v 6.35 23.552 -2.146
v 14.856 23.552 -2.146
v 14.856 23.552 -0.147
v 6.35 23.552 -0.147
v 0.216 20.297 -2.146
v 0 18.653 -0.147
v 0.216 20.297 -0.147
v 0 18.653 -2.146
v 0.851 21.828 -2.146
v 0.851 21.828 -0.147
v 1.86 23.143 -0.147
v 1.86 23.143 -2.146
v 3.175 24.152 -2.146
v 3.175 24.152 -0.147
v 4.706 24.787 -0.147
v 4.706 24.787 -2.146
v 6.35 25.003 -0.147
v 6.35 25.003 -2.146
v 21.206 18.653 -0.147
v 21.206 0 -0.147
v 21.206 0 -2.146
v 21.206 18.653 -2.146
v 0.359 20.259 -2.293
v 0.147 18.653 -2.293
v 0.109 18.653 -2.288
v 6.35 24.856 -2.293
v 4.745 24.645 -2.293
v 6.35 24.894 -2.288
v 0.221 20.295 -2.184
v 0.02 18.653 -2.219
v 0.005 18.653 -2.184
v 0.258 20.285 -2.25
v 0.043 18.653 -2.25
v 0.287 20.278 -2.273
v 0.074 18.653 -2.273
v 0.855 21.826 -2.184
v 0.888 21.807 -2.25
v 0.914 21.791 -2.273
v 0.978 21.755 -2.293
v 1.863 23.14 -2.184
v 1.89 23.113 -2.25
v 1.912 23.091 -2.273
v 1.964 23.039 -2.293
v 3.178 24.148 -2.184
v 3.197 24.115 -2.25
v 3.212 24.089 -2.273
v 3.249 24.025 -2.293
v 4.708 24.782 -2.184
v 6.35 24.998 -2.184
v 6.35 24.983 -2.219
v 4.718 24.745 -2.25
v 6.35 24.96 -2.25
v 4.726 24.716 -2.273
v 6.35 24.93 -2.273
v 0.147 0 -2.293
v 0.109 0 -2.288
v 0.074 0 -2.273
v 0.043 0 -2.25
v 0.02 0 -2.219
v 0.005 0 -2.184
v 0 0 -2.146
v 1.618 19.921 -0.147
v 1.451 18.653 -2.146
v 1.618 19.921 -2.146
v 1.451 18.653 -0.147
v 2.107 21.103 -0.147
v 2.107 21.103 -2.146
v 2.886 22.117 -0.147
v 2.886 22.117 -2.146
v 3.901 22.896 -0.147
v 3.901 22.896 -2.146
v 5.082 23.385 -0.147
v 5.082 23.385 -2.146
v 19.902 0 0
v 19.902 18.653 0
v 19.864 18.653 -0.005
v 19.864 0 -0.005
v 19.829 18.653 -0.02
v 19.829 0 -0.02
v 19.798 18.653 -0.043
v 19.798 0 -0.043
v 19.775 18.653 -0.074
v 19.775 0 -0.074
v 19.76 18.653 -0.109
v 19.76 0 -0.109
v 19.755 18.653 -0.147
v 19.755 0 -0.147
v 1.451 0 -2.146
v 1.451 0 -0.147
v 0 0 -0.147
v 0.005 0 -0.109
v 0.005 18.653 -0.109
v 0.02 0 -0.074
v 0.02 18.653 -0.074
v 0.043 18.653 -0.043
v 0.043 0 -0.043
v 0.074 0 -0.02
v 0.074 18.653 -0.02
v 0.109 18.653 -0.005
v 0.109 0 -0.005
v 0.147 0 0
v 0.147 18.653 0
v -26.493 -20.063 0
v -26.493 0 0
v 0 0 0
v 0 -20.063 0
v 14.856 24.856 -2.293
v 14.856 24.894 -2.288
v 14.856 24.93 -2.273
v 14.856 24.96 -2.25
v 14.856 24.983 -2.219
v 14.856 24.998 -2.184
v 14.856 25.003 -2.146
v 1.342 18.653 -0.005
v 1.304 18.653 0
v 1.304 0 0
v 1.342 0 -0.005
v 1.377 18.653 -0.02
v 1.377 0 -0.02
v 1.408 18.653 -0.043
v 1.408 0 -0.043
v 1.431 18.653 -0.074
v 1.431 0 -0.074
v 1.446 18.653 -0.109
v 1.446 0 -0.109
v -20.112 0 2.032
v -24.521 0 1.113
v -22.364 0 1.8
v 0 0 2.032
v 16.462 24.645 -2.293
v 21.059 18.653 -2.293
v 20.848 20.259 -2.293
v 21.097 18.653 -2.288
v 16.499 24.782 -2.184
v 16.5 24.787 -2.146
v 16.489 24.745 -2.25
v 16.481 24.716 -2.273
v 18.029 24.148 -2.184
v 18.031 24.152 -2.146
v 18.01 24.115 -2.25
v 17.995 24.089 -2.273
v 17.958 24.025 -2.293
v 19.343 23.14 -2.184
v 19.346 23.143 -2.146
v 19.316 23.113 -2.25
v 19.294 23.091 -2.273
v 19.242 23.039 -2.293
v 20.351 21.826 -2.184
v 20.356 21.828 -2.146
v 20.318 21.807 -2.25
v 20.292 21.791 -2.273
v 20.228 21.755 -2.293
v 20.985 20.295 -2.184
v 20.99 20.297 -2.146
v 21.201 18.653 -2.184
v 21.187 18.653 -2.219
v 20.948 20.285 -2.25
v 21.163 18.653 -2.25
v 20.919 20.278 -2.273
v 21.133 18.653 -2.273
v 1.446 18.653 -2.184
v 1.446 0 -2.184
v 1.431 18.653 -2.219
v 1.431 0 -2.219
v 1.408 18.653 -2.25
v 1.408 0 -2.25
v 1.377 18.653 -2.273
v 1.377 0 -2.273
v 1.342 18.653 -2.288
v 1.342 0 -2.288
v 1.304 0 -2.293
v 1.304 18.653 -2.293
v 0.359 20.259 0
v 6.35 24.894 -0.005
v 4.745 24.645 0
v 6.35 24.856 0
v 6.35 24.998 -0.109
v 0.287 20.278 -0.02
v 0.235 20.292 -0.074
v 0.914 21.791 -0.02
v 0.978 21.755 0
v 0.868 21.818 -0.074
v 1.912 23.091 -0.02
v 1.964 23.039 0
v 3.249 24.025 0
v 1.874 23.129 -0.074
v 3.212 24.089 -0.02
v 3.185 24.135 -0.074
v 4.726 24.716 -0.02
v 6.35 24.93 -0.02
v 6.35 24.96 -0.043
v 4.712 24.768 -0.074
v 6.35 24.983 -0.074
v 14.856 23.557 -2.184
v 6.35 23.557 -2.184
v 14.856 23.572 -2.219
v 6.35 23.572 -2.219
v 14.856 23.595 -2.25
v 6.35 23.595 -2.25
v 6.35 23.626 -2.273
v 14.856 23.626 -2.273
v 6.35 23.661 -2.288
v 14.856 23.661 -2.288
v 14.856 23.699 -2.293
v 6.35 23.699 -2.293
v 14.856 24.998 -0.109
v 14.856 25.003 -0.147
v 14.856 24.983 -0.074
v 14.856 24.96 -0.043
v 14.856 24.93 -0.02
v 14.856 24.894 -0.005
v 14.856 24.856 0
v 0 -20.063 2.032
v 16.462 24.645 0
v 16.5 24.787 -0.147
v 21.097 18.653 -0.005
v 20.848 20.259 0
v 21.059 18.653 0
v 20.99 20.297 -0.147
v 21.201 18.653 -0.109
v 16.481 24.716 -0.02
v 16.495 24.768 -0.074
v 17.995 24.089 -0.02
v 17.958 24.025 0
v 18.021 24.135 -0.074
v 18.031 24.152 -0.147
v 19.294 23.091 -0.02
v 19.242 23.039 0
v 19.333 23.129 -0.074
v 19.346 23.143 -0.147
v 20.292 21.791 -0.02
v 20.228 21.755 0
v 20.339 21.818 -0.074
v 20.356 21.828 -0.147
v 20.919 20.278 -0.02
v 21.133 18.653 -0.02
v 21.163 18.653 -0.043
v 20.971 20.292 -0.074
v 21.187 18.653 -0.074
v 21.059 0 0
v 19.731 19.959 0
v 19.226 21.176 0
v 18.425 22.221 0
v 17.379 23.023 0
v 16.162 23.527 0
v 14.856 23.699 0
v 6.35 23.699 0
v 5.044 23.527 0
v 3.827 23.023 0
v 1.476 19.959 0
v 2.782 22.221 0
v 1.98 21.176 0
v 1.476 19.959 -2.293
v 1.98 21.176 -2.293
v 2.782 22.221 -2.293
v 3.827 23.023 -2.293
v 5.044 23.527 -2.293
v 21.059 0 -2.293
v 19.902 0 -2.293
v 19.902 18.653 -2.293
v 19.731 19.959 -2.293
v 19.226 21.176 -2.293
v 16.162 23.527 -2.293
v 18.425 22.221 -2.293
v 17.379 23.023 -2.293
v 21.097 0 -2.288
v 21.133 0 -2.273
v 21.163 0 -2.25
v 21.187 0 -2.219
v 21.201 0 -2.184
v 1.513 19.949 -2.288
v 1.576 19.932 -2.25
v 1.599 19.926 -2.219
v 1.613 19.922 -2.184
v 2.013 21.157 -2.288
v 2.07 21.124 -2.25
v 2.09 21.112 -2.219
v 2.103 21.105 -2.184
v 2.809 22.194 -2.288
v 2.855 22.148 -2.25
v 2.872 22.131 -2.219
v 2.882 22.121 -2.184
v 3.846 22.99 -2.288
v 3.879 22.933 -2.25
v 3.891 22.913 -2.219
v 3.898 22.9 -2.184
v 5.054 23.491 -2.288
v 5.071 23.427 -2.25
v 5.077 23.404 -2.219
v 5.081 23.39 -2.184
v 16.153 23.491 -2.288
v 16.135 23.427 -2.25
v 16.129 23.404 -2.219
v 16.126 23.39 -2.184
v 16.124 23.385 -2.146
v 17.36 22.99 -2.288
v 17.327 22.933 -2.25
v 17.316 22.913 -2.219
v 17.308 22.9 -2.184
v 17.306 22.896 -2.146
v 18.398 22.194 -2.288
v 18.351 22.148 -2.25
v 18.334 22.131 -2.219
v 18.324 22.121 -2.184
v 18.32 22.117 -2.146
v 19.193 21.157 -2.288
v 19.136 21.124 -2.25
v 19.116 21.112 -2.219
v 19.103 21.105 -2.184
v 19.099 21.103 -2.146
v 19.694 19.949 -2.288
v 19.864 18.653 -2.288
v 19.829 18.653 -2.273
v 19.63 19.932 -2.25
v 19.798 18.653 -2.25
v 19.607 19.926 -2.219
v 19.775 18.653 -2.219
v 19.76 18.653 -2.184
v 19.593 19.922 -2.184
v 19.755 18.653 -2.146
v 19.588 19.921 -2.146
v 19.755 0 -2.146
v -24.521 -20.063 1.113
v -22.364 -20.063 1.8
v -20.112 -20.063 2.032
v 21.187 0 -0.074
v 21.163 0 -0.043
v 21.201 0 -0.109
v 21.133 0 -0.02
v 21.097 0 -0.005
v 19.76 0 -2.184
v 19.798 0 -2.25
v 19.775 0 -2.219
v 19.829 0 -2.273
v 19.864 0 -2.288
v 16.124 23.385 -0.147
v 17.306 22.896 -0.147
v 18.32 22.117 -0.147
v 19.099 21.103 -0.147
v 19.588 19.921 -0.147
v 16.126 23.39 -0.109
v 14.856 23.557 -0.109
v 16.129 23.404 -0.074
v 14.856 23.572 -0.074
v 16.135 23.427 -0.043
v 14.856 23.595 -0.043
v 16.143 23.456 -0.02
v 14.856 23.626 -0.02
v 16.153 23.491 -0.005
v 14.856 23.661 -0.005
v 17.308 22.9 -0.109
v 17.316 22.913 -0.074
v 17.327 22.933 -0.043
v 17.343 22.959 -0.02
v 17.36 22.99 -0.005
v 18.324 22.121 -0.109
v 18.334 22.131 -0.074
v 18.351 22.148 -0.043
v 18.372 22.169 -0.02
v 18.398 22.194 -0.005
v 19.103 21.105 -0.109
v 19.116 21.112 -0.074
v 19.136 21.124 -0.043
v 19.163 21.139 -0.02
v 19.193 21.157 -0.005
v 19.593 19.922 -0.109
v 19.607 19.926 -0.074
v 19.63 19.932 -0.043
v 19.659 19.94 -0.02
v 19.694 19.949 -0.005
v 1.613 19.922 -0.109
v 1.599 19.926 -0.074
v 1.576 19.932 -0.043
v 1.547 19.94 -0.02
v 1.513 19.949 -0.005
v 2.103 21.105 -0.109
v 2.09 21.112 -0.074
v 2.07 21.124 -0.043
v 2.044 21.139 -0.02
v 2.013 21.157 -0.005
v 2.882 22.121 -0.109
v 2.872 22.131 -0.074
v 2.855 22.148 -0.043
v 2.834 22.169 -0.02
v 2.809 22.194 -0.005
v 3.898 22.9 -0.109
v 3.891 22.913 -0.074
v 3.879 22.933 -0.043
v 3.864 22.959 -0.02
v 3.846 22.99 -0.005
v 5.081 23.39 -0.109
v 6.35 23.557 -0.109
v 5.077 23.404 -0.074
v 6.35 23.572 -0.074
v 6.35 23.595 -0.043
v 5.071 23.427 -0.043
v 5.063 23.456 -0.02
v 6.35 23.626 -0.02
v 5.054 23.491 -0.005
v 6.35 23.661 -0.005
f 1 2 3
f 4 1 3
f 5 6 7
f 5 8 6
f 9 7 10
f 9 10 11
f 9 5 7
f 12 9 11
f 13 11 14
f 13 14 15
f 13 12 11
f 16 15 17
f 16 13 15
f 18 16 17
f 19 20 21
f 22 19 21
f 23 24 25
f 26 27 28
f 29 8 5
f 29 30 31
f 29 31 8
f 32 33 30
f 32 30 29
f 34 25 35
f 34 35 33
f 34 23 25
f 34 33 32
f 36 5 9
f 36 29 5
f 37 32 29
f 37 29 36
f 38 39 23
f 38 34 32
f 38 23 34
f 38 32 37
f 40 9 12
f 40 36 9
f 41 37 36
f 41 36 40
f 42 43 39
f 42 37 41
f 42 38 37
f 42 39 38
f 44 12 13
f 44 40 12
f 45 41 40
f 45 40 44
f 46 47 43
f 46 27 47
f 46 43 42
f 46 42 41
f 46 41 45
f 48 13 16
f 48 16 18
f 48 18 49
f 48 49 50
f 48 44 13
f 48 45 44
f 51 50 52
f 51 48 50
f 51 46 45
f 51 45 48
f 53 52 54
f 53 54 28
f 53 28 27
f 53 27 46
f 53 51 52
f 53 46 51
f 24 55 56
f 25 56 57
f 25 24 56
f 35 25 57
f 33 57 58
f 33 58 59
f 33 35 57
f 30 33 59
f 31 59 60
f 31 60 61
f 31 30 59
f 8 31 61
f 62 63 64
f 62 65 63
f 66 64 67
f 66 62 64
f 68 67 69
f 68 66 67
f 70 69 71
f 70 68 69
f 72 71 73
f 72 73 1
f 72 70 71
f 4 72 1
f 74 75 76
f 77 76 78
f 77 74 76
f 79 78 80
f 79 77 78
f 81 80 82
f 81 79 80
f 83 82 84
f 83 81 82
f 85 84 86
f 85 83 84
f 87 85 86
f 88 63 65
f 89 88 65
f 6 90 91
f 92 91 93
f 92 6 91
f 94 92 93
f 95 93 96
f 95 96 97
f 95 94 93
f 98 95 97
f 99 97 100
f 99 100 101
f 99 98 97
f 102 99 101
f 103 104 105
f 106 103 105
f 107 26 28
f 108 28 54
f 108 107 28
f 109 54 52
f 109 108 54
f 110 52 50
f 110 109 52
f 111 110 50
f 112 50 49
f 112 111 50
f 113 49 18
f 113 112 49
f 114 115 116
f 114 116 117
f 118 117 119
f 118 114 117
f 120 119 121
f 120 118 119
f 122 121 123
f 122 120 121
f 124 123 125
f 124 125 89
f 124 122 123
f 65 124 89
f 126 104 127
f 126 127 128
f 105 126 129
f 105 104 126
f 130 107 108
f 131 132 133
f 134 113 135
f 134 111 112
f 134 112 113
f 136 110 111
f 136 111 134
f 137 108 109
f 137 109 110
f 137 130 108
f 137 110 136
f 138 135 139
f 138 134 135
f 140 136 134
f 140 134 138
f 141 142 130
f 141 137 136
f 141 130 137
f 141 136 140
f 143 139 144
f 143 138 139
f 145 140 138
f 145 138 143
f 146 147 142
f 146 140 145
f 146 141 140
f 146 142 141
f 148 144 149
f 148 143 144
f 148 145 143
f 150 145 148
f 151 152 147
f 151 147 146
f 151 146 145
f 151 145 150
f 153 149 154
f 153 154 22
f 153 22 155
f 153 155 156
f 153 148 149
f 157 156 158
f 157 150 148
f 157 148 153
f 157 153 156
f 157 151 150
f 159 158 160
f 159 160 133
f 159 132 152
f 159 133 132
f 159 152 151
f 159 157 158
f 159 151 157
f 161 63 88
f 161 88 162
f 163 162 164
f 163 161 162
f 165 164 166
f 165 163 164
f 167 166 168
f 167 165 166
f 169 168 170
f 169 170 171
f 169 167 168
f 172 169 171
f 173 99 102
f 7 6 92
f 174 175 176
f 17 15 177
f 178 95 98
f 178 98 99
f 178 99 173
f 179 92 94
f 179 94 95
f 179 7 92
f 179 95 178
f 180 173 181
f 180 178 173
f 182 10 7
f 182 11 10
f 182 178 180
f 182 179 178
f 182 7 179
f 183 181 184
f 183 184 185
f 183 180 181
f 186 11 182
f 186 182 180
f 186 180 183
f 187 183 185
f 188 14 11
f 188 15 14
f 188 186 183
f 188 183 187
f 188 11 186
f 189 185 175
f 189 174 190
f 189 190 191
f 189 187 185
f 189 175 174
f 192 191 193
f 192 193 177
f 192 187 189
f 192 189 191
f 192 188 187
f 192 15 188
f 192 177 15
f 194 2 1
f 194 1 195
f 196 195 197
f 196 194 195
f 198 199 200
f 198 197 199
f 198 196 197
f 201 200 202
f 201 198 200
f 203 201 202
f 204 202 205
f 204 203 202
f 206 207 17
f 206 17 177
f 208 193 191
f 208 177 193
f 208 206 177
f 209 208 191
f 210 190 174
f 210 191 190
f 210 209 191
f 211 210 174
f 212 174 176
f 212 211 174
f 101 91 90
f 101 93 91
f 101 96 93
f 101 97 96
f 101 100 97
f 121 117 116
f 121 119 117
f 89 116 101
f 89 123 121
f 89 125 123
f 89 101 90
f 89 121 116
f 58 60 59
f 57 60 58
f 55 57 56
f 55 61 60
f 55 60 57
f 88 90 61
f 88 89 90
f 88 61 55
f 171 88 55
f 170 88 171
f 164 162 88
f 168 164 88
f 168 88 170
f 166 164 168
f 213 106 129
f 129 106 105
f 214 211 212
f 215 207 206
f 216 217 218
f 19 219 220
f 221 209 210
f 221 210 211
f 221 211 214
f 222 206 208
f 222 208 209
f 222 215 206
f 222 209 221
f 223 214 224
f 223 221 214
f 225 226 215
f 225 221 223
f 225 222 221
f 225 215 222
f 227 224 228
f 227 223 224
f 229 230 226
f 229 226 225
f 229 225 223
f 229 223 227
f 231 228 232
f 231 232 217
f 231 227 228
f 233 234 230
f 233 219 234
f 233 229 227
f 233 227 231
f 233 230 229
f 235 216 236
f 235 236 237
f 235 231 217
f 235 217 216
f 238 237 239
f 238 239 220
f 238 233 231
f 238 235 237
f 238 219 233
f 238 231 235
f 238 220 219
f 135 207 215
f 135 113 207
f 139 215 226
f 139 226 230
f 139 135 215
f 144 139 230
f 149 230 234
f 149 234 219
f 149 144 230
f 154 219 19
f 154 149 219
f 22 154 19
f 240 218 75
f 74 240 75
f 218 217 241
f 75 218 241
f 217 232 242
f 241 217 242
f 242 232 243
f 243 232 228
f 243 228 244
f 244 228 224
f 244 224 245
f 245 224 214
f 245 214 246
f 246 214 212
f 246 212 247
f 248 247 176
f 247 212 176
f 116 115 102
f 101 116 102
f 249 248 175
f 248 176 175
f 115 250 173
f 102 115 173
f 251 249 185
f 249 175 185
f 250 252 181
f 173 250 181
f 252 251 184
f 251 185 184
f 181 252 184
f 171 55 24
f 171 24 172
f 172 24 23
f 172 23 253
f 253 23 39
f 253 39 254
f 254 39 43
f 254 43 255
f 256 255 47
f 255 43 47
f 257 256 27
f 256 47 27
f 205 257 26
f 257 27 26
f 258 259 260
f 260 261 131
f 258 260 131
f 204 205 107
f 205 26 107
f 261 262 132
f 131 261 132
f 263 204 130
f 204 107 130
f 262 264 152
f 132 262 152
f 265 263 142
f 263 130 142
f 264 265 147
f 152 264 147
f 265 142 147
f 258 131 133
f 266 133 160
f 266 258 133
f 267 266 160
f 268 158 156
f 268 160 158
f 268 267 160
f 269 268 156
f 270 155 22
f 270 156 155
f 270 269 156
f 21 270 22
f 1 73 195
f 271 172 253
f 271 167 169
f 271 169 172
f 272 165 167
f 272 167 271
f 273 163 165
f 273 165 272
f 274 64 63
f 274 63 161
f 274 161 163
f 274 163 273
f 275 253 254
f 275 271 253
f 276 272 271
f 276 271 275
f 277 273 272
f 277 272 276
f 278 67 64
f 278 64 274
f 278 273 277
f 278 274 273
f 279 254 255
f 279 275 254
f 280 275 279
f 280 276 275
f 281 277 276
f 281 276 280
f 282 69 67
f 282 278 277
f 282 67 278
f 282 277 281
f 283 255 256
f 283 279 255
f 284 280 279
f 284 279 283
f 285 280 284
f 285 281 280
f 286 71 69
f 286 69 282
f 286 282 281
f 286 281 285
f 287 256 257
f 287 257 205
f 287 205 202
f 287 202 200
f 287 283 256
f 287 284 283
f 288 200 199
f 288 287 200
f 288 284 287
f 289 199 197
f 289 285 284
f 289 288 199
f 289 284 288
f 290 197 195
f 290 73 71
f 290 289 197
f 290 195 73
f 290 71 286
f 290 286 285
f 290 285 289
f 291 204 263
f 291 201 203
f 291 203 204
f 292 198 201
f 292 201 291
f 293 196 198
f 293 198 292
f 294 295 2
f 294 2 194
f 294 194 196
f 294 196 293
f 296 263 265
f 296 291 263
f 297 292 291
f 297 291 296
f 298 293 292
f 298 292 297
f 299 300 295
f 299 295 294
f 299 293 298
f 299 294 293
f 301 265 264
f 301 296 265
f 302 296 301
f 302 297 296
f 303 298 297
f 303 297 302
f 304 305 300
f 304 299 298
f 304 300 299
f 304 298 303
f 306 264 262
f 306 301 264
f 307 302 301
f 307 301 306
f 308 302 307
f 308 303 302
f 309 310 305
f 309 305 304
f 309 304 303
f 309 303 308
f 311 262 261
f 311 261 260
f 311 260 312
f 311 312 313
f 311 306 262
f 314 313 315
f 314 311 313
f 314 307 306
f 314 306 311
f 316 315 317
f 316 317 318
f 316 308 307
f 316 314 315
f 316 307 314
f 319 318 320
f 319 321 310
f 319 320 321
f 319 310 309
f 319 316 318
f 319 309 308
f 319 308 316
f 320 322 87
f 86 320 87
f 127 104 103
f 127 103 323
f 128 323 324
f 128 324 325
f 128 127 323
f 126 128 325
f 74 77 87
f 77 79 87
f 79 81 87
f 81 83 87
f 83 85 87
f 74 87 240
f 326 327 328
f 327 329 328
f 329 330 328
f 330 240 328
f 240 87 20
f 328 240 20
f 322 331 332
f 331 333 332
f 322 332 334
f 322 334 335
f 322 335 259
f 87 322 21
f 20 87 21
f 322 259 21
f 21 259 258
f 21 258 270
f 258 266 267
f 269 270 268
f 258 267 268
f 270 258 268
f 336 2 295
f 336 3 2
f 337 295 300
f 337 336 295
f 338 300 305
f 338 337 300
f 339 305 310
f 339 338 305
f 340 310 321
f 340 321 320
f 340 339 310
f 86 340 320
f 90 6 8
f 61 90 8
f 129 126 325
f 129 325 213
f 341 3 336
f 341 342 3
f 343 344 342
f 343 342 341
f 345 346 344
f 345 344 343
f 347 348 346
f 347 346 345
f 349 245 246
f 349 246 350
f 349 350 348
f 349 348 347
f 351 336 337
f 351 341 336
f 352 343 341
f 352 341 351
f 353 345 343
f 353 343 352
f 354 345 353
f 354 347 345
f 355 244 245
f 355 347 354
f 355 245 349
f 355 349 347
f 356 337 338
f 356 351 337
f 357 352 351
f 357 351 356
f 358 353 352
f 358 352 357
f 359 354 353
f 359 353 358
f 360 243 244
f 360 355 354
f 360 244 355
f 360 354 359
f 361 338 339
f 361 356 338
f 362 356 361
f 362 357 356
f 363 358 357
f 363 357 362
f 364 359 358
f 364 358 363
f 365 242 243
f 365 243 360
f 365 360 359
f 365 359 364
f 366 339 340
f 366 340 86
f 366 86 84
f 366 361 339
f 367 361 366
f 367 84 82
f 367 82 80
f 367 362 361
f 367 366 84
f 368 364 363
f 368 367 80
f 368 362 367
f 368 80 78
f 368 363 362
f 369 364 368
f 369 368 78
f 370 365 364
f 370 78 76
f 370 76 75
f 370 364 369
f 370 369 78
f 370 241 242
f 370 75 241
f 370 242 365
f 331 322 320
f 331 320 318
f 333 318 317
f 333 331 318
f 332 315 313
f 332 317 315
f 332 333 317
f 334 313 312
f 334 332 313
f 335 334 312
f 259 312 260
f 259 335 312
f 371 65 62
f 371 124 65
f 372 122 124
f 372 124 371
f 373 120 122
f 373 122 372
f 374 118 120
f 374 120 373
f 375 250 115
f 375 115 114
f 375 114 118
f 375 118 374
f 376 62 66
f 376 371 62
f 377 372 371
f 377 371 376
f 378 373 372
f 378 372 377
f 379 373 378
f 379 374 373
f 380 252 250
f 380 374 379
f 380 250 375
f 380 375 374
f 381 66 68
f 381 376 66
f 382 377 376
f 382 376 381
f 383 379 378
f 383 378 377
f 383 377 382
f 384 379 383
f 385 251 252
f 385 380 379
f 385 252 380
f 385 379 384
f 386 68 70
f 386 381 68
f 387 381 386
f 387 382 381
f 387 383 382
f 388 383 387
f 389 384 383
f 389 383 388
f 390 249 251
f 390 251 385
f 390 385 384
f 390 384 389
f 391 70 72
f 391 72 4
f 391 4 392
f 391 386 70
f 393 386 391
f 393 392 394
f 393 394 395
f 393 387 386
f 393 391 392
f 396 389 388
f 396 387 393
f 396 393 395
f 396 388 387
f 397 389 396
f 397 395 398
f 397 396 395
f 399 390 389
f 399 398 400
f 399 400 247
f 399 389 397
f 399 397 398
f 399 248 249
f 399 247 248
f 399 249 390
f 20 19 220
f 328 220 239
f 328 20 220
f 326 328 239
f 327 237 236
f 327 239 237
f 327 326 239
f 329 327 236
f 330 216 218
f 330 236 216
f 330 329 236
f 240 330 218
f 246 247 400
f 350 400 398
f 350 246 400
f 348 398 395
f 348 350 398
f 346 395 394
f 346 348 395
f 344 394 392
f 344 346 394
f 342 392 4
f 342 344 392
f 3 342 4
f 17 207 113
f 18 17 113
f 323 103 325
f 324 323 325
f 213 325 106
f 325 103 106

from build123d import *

# Parameters (mm, degrees)
F2_W        = 26.4934301376
F2_H        = 20.0631171465
F3_DEPTH    = 2.032
F4_T1_DEPTH = 51.9725717919


# Not quite as in the source:
# - a fillet or chamfer that OpenCascade refuses, or shapes differently, is made with other operations: its cross-section is extruded or revolved along the edge and cut away or added


with BuildPart() as f3:
    # F2 (on Top) → F3 (new body)
    with BuildSketch(Plane.XY):
        with Locations((-13.2467150688, -10.0315585732)):
            Rectangle(F2_W, F2_H)
    extrude(amount=F3_DEPTH)

    # F4: fillet of radius 11.0377844072 on 1 edges, made by hand

    # F4_s2 → F4_t1 (cut)
    with BuildSketch(Plane.XZ.offset(-15.9547273227)):
        with BuildLine():
            ThreePointArc((-26.4934301376, 0), (-23.4603283864, 1.5117388593), (-20.1115392085, 2.032))
            Line((-20.1115392085, 2.032), (-26.4934301376, 2.032))
            Line((-26.4934301376, 2.032), (-26.4934301376, 0))
        make_face()
    extrude(amount=F4_T1_DEPTH, mode=Mode.SUBTRACT)


with BuildPart() as f5:
    # F5: sweep along a path in F0
    with BuildLine(Plane.XY) as f5_path:
        Line((0, 0), (0, 18.6531258911))
        ThreePointArc((0, 18.6531258911), (1.8598719395, 23.1432539516), (6.35, 25.0031258911))
        Line((6.35, 25.0031258911), (14.8563547224, 25.0031258911))
        ThreePointArc((14.8563547224, 25.0031258911), (19.3464827829, 23.1432539516), (21.2063547224, 18.6531258911))
        Line((21.2063547224, 18.6531258911), (21.2063547224, 0))
    # F1 (on Front) → F5 (sweep)
    with BuildSketch(Plane.XZ):
        with BuildLine():
            Line((1.30386401, 0), (0.1471562355, 0))
            ThreePointArc((0.1471562355, 0), (0.0431010635, -0.0431010635), (0, -0.1471562355))
            Line((0, -0.1471562355), (0, -2.1458242045))
            ThreePointArc((0, -2.1458242045), (0.0431010635, -2.2498793765), (0.1471562355, -2.29298044))
            Line((0.1471562355, -2.29298044), (1.30386401, -2.29298044))
            ThreePointArc((1.30386401, -2.29298044), (1.407919182, -2.2498793765), (1.4510202454, -2.1458242045))
            Line((1.4510202454, -2.1458242045), (1.4510202454, -0.1471562355))
            ThreePointArc((1.4510202454, -0.1471562355), (1.407919182, -0.0431010635), (1.30386401, 0))
        make_face()
    sweep(path=f5_path.line)


solid = Compound([f3.part, f5.part])
